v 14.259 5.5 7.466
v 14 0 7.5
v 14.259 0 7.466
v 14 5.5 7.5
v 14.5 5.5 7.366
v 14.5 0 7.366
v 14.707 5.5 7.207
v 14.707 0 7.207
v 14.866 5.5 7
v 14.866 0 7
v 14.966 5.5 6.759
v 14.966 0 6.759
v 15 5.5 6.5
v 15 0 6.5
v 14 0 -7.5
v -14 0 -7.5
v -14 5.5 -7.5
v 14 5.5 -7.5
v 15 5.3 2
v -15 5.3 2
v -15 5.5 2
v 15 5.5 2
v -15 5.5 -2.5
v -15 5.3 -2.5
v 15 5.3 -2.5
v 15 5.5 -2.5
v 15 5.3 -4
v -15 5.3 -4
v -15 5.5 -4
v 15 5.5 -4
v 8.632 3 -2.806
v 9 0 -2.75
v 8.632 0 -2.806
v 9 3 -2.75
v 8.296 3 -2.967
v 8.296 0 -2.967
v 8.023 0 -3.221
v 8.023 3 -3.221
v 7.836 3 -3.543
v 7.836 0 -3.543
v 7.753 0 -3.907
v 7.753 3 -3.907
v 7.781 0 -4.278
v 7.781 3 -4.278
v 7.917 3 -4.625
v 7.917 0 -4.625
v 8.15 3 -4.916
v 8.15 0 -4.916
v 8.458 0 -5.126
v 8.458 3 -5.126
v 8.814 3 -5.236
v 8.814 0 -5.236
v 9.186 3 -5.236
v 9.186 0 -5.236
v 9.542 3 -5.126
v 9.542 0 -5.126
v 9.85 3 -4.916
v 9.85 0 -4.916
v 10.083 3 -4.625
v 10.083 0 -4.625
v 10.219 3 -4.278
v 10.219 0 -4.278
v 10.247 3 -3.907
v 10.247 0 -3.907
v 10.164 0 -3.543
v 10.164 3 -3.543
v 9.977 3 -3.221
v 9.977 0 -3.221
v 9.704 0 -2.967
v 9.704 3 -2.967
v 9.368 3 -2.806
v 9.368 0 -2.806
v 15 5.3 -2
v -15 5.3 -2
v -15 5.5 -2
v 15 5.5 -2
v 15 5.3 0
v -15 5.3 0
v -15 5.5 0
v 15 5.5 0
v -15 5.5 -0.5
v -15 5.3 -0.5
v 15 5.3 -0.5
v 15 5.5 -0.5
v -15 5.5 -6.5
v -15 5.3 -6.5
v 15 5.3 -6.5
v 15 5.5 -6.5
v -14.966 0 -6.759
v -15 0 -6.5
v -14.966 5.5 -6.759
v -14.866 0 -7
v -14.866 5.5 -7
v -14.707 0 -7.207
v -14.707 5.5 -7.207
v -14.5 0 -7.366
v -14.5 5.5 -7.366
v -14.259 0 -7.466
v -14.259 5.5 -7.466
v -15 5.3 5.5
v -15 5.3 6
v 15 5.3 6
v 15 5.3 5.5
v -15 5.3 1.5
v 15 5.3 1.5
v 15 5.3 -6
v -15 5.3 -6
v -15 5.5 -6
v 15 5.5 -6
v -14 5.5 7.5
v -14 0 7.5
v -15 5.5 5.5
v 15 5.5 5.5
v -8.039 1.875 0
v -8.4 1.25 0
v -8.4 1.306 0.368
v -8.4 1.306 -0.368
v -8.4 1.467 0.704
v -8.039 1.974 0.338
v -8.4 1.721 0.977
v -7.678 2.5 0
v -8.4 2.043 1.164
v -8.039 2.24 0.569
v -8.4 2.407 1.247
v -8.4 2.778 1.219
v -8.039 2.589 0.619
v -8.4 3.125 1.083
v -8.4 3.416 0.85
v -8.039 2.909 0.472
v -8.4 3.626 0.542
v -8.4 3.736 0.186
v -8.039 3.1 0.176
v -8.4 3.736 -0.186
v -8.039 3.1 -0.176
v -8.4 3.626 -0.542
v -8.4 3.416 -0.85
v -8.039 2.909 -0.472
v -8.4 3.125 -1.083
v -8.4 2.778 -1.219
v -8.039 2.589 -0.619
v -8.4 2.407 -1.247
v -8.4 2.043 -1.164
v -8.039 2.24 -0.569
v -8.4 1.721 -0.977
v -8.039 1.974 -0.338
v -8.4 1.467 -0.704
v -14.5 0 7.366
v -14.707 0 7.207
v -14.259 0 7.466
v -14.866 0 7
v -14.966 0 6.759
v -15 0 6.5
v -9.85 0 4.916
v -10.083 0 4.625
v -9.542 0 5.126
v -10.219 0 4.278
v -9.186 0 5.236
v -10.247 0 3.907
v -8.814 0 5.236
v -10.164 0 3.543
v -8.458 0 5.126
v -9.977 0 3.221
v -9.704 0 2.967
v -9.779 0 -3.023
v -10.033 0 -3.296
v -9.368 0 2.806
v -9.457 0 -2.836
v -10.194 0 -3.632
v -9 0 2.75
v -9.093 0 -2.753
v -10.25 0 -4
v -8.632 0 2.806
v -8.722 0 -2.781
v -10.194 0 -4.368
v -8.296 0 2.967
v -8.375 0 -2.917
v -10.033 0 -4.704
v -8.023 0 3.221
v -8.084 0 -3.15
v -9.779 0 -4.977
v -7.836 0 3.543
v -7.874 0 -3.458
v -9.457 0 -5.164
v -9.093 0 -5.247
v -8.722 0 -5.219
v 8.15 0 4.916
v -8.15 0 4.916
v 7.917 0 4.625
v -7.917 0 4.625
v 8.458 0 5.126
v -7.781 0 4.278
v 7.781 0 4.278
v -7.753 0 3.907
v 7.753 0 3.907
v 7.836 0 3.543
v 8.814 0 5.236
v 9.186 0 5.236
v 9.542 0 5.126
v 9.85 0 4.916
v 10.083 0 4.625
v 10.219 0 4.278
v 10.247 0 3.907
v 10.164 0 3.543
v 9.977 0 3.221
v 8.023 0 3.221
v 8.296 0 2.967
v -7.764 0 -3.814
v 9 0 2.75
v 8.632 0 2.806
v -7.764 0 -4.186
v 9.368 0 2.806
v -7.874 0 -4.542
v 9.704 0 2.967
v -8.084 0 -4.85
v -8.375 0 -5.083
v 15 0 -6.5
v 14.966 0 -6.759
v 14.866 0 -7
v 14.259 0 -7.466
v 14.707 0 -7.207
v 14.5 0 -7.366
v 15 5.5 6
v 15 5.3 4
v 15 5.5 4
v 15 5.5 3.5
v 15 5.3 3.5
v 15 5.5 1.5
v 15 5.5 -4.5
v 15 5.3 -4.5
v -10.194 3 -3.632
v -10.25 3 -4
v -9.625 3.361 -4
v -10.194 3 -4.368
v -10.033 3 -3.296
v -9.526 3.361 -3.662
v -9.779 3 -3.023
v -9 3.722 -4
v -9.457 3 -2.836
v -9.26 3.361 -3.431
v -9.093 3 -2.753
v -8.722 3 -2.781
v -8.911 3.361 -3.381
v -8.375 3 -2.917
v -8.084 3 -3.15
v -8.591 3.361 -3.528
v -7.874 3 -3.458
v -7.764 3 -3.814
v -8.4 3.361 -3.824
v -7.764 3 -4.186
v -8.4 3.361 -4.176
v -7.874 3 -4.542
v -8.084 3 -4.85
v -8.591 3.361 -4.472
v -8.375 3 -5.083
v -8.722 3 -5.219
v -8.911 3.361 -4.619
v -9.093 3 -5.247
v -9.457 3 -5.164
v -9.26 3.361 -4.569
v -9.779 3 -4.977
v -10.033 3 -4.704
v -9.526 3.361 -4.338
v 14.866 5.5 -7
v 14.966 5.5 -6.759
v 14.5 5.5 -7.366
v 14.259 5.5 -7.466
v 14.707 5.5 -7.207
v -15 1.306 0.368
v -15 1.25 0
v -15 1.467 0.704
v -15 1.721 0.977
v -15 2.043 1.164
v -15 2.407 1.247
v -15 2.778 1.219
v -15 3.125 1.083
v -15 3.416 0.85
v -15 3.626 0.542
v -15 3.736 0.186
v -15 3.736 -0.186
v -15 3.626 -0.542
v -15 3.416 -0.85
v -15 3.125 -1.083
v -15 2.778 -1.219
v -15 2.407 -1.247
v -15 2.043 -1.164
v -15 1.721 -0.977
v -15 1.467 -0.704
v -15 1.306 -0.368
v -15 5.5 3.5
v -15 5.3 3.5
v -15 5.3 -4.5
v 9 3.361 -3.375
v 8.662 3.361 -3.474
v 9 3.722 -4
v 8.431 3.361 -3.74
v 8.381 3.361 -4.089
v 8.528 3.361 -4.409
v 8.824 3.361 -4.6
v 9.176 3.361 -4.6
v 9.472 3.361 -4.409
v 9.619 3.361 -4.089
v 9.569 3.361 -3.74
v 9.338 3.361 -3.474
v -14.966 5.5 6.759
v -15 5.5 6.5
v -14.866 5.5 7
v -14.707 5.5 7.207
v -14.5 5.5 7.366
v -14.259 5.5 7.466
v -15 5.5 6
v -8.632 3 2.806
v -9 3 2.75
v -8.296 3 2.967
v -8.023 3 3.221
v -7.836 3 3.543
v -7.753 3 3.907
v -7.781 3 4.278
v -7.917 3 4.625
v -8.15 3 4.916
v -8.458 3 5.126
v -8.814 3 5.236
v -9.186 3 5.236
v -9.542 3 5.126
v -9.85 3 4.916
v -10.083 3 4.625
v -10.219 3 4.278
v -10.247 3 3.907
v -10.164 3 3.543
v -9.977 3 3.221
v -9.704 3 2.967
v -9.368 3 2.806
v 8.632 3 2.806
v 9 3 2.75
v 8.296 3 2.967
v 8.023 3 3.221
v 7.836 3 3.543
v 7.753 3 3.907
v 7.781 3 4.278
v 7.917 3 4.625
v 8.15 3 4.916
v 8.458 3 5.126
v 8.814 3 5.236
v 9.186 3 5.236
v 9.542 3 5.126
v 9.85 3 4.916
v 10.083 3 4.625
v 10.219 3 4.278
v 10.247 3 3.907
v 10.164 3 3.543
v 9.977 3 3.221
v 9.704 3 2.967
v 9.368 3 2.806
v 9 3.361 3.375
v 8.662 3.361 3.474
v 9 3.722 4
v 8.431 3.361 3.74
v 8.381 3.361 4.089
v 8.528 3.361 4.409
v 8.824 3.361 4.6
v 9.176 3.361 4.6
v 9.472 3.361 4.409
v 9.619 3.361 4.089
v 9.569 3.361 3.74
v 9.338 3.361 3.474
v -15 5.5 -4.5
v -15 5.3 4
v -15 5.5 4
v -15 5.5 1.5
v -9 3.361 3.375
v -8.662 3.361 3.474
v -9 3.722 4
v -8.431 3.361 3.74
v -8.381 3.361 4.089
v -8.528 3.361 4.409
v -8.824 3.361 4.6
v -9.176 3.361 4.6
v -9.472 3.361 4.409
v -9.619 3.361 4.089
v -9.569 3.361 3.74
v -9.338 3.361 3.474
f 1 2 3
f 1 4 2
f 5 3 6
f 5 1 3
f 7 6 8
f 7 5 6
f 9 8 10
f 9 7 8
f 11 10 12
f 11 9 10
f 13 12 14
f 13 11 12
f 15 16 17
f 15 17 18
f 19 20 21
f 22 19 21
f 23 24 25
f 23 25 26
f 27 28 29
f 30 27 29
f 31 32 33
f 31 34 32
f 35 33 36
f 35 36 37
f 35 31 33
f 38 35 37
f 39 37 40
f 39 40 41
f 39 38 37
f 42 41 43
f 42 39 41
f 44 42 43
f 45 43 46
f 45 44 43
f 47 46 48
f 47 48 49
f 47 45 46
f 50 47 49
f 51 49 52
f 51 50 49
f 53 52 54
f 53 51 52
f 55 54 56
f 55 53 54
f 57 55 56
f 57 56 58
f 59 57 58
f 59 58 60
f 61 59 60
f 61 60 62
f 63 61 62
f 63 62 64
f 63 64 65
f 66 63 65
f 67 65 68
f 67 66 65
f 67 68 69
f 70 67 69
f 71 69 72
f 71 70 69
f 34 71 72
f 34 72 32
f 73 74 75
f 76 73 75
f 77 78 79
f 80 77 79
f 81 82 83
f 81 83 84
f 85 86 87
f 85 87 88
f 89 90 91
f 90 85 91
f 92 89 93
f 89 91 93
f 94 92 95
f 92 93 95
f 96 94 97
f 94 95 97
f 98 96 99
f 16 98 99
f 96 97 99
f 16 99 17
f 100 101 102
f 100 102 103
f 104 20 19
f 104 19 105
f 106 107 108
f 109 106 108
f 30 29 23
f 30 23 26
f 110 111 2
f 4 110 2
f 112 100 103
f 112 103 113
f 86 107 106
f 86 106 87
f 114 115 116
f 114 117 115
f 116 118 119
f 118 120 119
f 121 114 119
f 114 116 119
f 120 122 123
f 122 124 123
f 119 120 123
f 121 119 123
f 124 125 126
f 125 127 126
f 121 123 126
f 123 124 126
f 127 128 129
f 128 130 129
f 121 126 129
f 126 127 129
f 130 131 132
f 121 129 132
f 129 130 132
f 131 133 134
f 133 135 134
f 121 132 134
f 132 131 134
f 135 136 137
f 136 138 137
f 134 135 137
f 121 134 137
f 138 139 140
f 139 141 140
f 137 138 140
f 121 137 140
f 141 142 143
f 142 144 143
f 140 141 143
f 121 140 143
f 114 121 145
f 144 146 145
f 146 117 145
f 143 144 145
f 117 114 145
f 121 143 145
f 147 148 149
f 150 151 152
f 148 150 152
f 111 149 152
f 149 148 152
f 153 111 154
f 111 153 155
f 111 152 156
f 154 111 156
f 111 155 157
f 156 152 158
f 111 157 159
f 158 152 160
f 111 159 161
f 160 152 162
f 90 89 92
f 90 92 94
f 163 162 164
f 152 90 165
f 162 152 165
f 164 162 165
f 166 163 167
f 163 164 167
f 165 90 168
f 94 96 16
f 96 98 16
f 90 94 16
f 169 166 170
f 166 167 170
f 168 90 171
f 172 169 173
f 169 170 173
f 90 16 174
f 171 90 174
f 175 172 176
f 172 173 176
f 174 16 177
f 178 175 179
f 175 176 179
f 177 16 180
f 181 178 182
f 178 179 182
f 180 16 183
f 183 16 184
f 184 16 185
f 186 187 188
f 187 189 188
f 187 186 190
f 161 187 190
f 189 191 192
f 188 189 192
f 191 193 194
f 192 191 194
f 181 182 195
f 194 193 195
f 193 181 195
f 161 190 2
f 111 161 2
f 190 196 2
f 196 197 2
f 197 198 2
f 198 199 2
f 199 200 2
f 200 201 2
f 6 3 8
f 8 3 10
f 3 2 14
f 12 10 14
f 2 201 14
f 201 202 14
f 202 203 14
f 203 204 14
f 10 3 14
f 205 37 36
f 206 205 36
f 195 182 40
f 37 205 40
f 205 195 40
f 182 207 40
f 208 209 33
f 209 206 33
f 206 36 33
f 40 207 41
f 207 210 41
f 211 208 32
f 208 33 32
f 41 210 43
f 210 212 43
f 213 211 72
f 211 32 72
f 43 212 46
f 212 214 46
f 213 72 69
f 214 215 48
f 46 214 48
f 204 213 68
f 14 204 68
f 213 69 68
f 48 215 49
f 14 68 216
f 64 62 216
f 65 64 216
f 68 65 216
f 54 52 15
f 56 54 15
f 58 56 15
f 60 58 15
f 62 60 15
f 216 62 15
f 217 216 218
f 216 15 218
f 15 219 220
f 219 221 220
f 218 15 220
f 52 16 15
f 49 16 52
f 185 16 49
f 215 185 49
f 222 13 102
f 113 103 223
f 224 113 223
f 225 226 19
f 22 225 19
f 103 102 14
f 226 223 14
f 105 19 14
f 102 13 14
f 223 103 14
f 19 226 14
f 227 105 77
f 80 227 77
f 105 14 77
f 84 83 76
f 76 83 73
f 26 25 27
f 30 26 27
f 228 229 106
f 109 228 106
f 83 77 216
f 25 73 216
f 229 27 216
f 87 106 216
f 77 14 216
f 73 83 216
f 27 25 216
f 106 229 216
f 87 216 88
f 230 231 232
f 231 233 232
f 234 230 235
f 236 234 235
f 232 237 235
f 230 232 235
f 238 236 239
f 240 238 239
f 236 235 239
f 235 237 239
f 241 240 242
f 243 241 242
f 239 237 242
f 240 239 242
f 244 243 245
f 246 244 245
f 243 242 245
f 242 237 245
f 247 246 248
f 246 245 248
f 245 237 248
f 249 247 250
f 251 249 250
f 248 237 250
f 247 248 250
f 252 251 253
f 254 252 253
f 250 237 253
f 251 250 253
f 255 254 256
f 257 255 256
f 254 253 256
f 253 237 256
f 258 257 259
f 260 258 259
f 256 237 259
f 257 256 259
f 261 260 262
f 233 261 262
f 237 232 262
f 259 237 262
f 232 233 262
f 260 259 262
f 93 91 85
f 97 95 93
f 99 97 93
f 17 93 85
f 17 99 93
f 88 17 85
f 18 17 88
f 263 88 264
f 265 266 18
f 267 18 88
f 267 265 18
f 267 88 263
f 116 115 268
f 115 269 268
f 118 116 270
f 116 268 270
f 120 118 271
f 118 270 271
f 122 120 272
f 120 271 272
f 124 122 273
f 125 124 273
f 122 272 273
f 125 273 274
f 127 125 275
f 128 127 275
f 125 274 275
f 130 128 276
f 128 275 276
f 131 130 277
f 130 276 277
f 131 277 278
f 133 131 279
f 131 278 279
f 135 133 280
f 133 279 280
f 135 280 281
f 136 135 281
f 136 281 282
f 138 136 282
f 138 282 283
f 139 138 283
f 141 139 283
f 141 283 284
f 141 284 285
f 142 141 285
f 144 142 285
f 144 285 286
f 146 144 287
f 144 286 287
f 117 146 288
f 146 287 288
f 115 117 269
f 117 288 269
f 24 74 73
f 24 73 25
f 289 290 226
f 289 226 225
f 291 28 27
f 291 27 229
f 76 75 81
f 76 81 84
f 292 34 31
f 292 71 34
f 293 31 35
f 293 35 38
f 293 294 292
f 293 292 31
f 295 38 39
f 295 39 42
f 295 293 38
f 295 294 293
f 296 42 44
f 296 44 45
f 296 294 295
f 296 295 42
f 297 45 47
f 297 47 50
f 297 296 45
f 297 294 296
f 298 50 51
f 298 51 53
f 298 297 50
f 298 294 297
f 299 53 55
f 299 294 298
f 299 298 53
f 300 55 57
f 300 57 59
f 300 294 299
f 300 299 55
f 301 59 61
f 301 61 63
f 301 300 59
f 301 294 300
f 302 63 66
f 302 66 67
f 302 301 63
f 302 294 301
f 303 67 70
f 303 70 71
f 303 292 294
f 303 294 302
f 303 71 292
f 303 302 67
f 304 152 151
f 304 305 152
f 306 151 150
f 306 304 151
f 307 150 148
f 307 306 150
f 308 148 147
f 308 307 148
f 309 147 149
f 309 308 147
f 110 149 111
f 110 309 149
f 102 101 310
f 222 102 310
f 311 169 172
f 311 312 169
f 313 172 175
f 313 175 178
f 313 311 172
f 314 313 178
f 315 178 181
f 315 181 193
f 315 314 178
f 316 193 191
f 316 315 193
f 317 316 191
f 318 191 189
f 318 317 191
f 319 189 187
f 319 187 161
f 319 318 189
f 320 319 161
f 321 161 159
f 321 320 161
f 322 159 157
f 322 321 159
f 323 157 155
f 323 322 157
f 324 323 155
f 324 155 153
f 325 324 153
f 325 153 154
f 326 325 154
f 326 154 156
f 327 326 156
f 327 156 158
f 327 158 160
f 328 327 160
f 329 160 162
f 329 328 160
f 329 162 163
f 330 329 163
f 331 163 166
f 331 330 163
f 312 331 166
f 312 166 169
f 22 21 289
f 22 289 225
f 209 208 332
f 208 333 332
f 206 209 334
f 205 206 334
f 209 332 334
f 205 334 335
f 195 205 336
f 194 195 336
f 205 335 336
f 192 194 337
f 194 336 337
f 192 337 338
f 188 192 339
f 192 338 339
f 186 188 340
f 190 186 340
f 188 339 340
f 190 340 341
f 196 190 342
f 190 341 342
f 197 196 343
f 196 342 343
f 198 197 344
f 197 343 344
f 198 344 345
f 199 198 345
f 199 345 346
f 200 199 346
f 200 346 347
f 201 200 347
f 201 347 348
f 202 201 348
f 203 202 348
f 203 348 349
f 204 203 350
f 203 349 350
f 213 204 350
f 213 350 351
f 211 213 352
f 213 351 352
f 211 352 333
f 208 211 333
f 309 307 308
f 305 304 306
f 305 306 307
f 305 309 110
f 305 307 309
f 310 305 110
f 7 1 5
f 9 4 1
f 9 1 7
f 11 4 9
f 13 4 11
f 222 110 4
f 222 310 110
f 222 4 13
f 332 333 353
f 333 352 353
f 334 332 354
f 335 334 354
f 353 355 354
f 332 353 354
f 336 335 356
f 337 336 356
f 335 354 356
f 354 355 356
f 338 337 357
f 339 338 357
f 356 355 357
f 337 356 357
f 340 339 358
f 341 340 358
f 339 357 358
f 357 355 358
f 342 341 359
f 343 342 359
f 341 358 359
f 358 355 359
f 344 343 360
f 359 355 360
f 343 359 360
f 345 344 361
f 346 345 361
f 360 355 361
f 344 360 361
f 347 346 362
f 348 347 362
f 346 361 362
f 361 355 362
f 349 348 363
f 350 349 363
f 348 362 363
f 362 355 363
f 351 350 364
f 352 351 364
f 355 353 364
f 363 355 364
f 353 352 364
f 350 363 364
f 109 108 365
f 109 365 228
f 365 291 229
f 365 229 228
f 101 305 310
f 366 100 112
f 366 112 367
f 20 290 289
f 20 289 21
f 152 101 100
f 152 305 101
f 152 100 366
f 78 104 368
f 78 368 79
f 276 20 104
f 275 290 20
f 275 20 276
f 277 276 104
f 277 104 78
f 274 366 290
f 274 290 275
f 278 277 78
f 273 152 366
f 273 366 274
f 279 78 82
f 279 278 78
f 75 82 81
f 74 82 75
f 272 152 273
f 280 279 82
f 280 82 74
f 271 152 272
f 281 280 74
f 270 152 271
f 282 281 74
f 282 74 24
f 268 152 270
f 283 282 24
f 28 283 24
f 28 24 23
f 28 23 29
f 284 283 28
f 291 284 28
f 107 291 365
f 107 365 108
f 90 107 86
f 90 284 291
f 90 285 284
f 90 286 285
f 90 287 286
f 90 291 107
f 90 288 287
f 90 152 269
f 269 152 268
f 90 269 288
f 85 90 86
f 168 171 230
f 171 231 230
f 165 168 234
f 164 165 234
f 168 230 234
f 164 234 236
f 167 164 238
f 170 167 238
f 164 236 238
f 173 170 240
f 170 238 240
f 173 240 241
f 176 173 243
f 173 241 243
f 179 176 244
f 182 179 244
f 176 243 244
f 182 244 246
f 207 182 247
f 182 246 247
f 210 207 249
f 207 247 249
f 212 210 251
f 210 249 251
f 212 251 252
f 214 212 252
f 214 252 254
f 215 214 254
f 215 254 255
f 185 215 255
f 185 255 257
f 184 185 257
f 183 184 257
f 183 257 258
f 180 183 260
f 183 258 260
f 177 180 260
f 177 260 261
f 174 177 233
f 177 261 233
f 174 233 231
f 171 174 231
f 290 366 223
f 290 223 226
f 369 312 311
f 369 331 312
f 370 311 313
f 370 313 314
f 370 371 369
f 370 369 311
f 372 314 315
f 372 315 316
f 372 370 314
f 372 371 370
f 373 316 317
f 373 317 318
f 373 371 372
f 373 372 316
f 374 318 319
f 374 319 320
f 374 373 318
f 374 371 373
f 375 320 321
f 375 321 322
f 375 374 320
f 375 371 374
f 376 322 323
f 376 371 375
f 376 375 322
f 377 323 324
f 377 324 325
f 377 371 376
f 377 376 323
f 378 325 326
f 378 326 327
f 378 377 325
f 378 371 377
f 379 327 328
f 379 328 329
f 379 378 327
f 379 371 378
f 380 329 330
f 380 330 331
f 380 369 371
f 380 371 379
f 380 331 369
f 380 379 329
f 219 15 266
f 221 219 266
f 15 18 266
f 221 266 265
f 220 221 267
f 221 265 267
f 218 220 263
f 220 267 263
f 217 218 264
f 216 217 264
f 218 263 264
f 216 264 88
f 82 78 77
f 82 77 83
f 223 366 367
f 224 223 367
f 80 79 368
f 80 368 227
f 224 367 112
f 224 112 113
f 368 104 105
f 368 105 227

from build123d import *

# Parameters (mm, degrees)
SKETCH1_W               = 30
SKETCH1_H               = 15
BOSS_EXTRUDE1_DEPTH     = 5.5
CUT_EXTRUDE2_DEPTH      = 18.649362595
CUT_EXTRUDE2_DEPTH_BACK = 18.649362595
SKETCH2_W               = 0.5
SKETCH2_H               = 0.2
FILLET1_R               = 1


with BuildPart() as part:
    # Sketch1 → Boss-Extrude1 (new body)
    with BuildSketch(Plane(origin=(0, 0, 0), x_dir=(1, 0, 0), z_dir=(0, 1, 0))):
        Rectangle(SKETCH1_W, SKETCH1_H)
    extrude(amount=BOSS_EXTRUDE1_DEPTH)

    # Sketch2 → Cut-Extrude2 (cut, two sides: drawn at the far end of the back side and taken through both)
    with BuildSketch(Plane(origin=(0, 0, 0), x_dir=(0, 0, -1), z_dir=(1, 0, 0)).offset(-CUT_EXTRUDE2_DEPTH_BACK)):
        with Locations((-5.75, 5.4)):
            Rectangle(SKETCH2_W, SKETCH2_H)
        with Locations((-3.75, 5.4)):
            Rectangle(SKETCH2_W, SKETCH2_H)
        with Locations((-1.75, 5.4)):
            Rectangle(SKETCH2_W, SKETCH2_H)
        with Locations((0.25, 5.4)):
            Rectangle(SKETCH2_W, SKETCH2_H)
        with Locations((2.25, 5.4)):
            Rectangle(SKETCH2_W, SKETCH2_H)
        with Locations((4.25, 5.4)):
            Rectangle(SKETCH2_W, SKETCH2_H)
        with Locations((6.25, 5.4)):
            Rectangle(SKETCH2_W, SKETCH2_H)
    extrude(amount=CUT_EXTRUDE2_DEPTH + CUT_EXTRUDE2_DEPTH_BACK, mode=Mode.SUBTRACT)

    # Sketch8 → Cut-Revolve1 (revolve, cut)
    with BuildSketch(Plane.XY.offset(4), mode=Mode.PRIVATE) as cut_revolve1_sk:
        Polygon((10.25, 0), (10.25, 3), (9, 3.721687836), (9, 0), align=None)
    cut_revolve1 = revolve(cut_revolve1_sk.sketch.rotate(Axis((9, 0, 4), (0, 1, 0)), 90), axis=Axis((9, 0, 4), (0, 1, 0)), mode=Mode.SUBTRACT)

    # Mirror1: Cut-Revolve1 across plane
    add(cut_revolve1.mirror(Plane.XY), mode=Mode.SUBTRACT)

    # Mirror2: Cut-Revolve1 across plane
    add(cut_revolve1.mirror(Plane(origin=(0, 0, 0), x_dir=(0, 0, 1), z_dir=(1, 0, 0))), mode=Mode.SUBTRACT)

    # Mirror2 copy 1 sketch → Mirror2 copy 1 (revolve, cut)
    with BuildSketch(Plane(origin=(0, 0, -4), x_dir=(-1, 0, 0), z_dir=(0, 0, -1))):
        Polygon((10.25, 0), (10.25, 3), (9, 3.721687836), (9, 0), align=None)
    revolve(axis=Axis((-9, 0, -4), (0, 1, 0)), mode=Mode.SUBTRACT)

    # Sketch9 → Cut-Revolve2 (revolve, cut)
    with BuildSketch(Plane.XY, mode=Mode.PRIVATE) as cut_revolve2_sk:
        Polygon((-15, 2.5), (-7.678312164, 2.5), (-8.4, 3.75), (-15, 3.75), align=None)
    revolve(cut_revolve2_sk.sketch.rotate(Axis((-15, 2.5, 0), (-1, 0, 0)), 180), axis=Axis((-15, 2.5, 0), (-1, 0, 0)), mode=Mode.SUBTRACT)

    # Fillet1
    fillet1_edges = [part.edges().sort_by_distance(p)[0] for p in [
        (-15, 2.75, -7.5),
        (15, 2.75, -7.5),
        (15, 2.75, 7.5),
        (-15, 2.75, 7.5),
    ]]
    fillet(fillet1_edges, radius=FILLET1_R - 0.0001)  # a hair under: the kernel refuses the full size


solid = part.part
